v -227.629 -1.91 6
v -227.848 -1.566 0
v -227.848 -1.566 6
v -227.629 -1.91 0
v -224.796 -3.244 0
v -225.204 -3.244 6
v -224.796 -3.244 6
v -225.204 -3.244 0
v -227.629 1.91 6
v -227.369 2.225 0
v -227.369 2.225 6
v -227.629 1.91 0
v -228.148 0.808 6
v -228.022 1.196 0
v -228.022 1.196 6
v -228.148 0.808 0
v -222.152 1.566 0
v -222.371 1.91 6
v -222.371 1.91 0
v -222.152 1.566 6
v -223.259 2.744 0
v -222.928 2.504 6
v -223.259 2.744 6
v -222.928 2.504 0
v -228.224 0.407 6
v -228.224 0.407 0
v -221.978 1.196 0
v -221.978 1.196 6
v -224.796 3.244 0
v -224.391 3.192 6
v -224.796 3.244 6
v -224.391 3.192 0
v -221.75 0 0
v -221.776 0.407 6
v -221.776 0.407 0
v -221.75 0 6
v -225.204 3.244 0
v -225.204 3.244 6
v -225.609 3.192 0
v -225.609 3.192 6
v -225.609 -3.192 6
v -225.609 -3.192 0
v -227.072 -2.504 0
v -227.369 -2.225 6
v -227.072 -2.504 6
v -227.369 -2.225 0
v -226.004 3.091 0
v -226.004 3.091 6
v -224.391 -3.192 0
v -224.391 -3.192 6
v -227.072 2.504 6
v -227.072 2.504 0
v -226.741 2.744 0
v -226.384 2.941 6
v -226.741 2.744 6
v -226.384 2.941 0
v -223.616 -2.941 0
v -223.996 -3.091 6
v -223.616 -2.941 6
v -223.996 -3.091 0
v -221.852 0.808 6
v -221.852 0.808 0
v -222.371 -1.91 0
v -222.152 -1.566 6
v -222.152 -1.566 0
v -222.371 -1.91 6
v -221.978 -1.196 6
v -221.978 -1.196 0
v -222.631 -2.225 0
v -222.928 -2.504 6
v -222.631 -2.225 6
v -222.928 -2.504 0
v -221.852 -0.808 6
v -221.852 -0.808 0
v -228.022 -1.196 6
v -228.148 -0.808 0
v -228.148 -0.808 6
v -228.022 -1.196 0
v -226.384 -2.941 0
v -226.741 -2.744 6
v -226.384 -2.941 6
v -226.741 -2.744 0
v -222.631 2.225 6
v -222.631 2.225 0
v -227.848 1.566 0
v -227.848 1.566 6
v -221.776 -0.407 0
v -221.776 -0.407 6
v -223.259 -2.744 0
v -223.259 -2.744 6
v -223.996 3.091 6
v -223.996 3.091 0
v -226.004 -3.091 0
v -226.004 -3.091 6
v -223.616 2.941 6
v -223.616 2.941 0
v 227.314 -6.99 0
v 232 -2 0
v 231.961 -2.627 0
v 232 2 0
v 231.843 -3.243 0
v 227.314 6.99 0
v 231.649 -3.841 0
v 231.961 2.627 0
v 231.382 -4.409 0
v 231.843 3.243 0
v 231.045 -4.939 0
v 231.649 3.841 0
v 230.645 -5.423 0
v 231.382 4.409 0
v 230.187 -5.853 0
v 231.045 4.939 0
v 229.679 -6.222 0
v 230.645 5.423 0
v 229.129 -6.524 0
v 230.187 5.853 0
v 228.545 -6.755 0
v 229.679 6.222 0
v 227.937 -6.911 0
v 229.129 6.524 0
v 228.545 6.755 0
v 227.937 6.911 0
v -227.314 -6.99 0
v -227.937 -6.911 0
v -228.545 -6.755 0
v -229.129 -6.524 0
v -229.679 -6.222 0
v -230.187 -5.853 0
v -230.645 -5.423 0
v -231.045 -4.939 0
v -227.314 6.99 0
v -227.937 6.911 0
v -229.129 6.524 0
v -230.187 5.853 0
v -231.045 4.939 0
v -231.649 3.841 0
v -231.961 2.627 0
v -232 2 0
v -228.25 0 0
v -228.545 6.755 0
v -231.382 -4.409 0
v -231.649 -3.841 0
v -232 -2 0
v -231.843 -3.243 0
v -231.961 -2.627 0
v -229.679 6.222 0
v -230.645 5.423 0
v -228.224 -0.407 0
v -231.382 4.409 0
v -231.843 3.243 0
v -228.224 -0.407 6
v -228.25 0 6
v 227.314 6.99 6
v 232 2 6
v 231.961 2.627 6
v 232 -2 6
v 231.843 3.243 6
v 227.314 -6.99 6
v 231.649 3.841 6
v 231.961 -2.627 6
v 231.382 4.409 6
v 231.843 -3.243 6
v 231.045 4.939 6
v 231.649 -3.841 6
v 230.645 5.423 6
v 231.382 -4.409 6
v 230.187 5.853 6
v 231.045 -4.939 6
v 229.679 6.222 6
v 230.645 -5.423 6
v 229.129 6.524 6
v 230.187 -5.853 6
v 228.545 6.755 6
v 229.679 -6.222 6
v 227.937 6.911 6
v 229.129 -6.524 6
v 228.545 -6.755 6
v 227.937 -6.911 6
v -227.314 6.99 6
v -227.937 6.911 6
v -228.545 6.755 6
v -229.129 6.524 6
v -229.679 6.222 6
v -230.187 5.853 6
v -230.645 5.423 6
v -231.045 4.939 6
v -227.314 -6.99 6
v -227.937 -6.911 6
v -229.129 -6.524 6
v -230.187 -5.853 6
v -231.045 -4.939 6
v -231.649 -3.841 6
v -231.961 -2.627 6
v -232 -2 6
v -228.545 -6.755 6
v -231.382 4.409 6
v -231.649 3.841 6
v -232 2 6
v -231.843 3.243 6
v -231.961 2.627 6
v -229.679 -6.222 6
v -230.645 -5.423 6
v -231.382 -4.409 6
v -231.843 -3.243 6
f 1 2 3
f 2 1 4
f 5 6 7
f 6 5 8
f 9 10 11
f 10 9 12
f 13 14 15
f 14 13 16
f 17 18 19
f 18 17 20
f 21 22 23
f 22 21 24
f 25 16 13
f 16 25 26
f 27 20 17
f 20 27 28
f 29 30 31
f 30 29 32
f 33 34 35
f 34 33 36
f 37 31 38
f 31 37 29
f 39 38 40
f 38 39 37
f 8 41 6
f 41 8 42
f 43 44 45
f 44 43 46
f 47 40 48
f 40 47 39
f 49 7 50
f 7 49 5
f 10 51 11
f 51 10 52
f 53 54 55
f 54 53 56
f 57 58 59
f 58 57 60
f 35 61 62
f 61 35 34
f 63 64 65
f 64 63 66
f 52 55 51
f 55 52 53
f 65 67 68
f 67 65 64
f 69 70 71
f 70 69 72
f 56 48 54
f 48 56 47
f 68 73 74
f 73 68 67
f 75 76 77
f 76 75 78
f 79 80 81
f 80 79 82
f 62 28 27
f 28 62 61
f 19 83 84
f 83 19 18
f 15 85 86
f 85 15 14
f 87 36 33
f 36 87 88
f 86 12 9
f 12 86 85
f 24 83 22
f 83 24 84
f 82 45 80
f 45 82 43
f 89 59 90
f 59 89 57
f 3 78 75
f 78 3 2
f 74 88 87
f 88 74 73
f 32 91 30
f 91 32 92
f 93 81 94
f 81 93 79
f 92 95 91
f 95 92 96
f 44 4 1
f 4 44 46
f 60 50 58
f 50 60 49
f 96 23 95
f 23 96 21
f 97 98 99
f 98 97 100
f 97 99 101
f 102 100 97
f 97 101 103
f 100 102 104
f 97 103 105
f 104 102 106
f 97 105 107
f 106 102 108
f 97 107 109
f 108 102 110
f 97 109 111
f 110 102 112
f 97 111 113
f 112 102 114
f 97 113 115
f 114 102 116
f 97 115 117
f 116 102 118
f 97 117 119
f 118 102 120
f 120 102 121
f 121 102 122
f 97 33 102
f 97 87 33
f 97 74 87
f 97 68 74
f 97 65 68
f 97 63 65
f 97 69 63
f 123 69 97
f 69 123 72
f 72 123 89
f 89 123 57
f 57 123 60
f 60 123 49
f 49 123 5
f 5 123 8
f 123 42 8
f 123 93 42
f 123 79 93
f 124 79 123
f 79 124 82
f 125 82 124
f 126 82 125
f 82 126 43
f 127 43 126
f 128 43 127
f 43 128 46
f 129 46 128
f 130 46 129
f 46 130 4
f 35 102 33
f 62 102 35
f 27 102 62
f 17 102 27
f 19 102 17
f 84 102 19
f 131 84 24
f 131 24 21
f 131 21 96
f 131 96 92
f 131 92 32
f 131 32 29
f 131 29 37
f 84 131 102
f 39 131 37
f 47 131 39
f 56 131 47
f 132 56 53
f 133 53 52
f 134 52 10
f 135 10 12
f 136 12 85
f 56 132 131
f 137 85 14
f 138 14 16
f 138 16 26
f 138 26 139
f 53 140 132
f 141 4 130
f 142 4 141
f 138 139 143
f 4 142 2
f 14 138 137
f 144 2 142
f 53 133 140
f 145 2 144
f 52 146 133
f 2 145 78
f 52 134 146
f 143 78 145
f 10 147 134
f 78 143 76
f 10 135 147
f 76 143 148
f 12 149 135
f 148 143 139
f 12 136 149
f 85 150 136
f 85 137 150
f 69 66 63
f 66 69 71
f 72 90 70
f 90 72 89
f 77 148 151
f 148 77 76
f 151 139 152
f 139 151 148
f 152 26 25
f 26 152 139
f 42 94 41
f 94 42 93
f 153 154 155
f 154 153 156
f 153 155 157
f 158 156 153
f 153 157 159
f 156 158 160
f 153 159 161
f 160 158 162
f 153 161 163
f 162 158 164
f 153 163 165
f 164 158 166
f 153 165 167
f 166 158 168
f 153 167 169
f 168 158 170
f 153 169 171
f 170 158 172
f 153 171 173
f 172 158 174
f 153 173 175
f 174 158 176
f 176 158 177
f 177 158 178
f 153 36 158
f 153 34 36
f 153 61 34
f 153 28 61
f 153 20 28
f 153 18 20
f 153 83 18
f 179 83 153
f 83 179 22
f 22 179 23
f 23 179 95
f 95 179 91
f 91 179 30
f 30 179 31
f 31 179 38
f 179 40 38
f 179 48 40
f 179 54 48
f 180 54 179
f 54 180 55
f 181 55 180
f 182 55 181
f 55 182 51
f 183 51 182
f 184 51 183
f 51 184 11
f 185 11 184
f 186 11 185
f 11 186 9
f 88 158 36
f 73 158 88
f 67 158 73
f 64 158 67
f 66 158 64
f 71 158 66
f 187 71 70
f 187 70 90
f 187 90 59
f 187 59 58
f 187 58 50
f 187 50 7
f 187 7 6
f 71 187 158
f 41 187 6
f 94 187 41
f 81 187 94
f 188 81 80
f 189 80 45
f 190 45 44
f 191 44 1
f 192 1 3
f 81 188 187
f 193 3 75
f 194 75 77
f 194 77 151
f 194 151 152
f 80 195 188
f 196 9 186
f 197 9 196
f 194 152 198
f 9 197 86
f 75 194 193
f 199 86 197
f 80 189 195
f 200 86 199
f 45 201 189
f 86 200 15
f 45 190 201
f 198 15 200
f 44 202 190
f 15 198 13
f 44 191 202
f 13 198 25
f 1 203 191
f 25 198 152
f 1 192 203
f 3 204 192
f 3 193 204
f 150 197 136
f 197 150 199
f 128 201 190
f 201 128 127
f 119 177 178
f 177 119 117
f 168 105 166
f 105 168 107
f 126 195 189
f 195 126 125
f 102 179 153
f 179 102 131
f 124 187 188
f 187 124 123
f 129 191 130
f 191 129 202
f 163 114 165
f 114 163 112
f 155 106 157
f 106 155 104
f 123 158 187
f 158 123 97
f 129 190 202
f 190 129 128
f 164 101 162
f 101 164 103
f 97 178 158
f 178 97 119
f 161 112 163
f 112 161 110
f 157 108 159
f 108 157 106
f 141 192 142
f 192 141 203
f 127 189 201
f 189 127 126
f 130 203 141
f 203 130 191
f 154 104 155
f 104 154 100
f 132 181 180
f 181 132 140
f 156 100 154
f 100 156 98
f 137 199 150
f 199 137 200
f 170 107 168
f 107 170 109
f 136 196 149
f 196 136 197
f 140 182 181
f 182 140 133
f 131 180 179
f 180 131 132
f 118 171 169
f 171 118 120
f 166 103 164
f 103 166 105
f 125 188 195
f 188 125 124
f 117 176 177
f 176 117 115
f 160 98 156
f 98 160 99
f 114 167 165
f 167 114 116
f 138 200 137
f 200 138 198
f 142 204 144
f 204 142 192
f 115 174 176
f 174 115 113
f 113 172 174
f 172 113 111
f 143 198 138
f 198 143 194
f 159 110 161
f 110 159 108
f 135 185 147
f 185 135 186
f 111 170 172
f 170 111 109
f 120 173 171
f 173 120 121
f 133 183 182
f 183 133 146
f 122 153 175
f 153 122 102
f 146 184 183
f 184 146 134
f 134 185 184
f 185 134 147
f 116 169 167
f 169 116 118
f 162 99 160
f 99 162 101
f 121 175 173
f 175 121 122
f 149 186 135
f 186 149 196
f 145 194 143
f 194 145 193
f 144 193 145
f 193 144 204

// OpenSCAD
$fn = 50;


difference() {
	union() {
		hull() {
			translate(v = [-227.0000000000, 2.0000000000, 0]) {
				cylinder(h = 6, r = 5);
			}
			translate(v = [227.0000000000, 2.0000000000, 0]) {
				cylinder(h = 6, r = 5);
			}
			translate(v = [-227.0000000000, -2.0000000000, 0]) {
				cylinder(h = 6, r = 5);
			}
			translate(v = [227.0000000000, -2.0000000000, 0]) {
				cylinder(h = 6, r = 5);
			}
		}
	}
	union() {
		translate(v = [-225.0000000000, 0.0000000000, 0]) {
			cylinder(h = 6, r = 3.2500000000);
		}
		translate(v = [-225.0000000000, 0.0000000000, 0]) {
			cylinder(h = 6, r = 1.8000000000);
		}
		translate(v = [-225.0000000000, 0.0000000000, 0]) {
			cylinder(h = 6, r = 1.8000000000);
		}
		translate(v = [-225.0000000000, 0.0000000000, 0]) {
			cylinder(h = 6, r = 1.8000000000);
		}
	}
}
